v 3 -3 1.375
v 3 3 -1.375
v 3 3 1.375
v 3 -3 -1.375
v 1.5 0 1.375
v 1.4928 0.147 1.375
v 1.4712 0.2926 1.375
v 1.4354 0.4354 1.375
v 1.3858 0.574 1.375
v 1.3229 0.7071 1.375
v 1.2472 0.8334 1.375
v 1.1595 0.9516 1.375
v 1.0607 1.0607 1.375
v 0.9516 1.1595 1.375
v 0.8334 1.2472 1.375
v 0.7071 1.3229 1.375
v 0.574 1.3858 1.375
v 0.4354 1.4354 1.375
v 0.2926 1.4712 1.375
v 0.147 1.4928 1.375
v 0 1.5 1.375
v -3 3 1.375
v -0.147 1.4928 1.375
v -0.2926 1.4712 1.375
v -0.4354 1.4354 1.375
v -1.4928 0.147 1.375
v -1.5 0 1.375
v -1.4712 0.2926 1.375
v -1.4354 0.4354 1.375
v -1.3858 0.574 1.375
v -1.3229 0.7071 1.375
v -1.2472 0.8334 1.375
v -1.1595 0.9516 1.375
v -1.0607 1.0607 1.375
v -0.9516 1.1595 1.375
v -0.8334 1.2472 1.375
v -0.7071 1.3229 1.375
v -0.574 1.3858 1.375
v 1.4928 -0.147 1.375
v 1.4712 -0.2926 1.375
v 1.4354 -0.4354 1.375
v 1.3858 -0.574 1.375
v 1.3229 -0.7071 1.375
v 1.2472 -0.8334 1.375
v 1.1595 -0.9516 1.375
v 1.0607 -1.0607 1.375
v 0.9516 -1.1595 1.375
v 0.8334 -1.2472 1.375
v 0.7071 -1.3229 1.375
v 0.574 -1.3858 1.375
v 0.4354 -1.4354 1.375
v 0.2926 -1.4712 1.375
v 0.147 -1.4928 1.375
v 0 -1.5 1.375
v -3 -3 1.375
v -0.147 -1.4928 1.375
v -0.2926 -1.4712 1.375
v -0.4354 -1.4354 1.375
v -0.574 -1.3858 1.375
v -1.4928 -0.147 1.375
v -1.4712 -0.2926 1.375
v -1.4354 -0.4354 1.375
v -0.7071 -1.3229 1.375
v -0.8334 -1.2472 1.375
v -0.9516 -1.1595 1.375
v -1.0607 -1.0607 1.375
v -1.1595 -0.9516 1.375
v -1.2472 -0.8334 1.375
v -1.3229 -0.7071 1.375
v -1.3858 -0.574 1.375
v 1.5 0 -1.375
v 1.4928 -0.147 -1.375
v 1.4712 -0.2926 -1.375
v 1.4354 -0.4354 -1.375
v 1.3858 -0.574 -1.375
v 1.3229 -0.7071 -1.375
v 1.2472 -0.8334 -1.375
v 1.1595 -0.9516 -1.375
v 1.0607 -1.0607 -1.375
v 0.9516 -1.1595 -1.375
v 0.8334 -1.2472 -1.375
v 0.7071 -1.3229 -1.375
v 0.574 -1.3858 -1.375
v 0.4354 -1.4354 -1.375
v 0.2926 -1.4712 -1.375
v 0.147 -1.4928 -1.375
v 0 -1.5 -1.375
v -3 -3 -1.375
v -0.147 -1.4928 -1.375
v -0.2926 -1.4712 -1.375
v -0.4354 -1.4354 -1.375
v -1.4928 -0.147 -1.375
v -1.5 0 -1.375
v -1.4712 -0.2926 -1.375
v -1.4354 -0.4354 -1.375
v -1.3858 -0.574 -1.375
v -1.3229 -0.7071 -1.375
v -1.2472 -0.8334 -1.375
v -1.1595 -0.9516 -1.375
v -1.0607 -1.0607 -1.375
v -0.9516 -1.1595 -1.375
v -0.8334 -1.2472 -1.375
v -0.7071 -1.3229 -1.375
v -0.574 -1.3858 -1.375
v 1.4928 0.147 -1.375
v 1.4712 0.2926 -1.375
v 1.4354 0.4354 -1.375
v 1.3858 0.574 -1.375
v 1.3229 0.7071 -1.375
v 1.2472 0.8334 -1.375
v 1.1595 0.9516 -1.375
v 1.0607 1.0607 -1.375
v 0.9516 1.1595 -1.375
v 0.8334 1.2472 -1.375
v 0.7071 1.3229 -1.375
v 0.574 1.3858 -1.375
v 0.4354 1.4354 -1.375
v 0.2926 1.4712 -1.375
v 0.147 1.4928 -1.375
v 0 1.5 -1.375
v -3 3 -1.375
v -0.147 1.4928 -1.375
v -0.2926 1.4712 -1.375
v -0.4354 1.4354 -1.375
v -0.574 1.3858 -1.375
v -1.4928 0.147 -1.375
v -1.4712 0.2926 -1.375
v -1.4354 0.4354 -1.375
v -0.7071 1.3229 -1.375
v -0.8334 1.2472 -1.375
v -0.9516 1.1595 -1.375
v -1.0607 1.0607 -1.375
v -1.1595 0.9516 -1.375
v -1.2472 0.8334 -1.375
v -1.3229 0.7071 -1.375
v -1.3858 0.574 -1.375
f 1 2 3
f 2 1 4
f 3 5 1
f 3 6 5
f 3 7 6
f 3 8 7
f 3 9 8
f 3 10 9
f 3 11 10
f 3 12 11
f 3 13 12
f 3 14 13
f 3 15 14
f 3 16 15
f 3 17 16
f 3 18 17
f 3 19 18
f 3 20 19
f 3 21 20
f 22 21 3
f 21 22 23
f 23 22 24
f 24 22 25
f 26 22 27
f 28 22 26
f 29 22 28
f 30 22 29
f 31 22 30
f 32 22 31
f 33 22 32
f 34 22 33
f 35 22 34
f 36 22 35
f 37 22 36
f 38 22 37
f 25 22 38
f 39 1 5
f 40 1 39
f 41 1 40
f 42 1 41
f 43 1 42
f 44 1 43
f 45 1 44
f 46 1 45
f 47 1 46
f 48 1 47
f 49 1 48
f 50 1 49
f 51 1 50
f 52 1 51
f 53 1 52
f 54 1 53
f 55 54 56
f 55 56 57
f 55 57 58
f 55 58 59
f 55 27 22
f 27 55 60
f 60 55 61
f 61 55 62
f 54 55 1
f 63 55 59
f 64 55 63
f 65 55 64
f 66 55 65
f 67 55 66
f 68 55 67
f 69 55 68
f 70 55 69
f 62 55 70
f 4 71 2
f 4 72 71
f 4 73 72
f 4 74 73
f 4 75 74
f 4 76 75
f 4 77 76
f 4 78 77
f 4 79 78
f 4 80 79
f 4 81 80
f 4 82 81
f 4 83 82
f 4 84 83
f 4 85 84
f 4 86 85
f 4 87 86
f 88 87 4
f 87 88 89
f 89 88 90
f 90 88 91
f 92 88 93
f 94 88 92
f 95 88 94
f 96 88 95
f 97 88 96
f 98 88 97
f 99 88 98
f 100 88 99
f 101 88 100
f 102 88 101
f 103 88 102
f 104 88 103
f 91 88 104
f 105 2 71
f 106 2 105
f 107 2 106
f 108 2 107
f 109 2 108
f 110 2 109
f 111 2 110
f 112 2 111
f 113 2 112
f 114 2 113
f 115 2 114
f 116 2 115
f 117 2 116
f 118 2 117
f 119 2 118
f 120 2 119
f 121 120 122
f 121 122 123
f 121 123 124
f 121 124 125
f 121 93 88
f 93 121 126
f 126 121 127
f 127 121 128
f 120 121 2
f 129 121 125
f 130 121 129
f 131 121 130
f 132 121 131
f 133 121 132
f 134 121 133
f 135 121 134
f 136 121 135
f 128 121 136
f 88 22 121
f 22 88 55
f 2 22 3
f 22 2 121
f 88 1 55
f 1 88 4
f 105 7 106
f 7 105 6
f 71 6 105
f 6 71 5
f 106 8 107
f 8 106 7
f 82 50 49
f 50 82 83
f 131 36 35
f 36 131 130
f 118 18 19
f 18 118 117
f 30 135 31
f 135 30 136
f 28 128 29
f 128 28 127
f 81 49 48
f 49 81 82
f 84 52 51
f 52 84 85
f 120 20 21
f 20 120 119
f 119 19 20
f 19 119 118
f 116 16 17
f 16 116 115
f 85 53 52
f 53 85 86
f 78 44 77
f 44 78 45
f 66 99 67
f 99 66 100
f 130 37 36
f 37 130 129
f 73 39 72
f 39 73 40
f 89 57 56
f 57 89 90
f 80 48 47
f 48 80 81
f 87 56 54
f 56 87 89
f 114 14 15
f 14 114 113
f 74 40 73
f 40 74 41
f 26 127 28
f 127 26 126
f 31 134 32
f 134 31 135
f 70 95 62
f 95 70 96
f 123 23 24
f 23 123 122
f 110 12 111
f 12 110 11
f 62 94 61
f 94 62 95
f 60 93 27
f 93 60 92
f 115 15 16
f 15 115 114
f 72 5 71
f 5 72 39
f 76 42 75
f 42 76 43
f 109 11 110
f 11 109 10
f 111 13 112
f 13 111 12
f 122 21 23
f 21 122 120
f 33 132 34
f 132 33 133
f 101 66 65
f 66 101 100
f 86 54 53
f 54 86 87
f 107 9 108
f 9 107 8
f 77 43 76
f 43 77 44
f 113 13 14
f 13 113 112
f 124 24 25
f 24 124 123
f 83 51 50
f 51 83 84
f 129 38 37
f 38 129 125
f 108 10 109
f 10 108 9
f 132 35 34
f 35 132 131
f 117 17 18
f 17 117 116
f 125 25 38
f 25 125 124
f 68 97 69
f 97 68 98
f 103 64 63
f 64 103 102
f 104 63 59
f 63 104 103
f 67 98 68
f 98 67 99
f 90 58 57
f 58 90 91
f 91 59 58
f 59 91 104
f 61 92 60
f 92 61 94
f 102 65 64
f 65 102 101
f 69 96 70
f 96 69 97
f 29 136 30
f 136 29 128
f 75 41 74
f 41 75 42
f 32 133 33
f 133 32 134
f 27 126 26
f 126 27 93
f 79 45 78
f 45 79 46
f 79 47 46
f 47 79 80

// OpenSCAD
module t_slot_nut() {
    difference() {
        // Main body of the T-slot nut
        cube([6, 6, 2.75], center = true);
        
        // Hole for the screw
        translate([0, 0, -1.375])
            cylinder(h = 4, r = 1.5, $fn = 64);
    }
}

t_slot_nut();
